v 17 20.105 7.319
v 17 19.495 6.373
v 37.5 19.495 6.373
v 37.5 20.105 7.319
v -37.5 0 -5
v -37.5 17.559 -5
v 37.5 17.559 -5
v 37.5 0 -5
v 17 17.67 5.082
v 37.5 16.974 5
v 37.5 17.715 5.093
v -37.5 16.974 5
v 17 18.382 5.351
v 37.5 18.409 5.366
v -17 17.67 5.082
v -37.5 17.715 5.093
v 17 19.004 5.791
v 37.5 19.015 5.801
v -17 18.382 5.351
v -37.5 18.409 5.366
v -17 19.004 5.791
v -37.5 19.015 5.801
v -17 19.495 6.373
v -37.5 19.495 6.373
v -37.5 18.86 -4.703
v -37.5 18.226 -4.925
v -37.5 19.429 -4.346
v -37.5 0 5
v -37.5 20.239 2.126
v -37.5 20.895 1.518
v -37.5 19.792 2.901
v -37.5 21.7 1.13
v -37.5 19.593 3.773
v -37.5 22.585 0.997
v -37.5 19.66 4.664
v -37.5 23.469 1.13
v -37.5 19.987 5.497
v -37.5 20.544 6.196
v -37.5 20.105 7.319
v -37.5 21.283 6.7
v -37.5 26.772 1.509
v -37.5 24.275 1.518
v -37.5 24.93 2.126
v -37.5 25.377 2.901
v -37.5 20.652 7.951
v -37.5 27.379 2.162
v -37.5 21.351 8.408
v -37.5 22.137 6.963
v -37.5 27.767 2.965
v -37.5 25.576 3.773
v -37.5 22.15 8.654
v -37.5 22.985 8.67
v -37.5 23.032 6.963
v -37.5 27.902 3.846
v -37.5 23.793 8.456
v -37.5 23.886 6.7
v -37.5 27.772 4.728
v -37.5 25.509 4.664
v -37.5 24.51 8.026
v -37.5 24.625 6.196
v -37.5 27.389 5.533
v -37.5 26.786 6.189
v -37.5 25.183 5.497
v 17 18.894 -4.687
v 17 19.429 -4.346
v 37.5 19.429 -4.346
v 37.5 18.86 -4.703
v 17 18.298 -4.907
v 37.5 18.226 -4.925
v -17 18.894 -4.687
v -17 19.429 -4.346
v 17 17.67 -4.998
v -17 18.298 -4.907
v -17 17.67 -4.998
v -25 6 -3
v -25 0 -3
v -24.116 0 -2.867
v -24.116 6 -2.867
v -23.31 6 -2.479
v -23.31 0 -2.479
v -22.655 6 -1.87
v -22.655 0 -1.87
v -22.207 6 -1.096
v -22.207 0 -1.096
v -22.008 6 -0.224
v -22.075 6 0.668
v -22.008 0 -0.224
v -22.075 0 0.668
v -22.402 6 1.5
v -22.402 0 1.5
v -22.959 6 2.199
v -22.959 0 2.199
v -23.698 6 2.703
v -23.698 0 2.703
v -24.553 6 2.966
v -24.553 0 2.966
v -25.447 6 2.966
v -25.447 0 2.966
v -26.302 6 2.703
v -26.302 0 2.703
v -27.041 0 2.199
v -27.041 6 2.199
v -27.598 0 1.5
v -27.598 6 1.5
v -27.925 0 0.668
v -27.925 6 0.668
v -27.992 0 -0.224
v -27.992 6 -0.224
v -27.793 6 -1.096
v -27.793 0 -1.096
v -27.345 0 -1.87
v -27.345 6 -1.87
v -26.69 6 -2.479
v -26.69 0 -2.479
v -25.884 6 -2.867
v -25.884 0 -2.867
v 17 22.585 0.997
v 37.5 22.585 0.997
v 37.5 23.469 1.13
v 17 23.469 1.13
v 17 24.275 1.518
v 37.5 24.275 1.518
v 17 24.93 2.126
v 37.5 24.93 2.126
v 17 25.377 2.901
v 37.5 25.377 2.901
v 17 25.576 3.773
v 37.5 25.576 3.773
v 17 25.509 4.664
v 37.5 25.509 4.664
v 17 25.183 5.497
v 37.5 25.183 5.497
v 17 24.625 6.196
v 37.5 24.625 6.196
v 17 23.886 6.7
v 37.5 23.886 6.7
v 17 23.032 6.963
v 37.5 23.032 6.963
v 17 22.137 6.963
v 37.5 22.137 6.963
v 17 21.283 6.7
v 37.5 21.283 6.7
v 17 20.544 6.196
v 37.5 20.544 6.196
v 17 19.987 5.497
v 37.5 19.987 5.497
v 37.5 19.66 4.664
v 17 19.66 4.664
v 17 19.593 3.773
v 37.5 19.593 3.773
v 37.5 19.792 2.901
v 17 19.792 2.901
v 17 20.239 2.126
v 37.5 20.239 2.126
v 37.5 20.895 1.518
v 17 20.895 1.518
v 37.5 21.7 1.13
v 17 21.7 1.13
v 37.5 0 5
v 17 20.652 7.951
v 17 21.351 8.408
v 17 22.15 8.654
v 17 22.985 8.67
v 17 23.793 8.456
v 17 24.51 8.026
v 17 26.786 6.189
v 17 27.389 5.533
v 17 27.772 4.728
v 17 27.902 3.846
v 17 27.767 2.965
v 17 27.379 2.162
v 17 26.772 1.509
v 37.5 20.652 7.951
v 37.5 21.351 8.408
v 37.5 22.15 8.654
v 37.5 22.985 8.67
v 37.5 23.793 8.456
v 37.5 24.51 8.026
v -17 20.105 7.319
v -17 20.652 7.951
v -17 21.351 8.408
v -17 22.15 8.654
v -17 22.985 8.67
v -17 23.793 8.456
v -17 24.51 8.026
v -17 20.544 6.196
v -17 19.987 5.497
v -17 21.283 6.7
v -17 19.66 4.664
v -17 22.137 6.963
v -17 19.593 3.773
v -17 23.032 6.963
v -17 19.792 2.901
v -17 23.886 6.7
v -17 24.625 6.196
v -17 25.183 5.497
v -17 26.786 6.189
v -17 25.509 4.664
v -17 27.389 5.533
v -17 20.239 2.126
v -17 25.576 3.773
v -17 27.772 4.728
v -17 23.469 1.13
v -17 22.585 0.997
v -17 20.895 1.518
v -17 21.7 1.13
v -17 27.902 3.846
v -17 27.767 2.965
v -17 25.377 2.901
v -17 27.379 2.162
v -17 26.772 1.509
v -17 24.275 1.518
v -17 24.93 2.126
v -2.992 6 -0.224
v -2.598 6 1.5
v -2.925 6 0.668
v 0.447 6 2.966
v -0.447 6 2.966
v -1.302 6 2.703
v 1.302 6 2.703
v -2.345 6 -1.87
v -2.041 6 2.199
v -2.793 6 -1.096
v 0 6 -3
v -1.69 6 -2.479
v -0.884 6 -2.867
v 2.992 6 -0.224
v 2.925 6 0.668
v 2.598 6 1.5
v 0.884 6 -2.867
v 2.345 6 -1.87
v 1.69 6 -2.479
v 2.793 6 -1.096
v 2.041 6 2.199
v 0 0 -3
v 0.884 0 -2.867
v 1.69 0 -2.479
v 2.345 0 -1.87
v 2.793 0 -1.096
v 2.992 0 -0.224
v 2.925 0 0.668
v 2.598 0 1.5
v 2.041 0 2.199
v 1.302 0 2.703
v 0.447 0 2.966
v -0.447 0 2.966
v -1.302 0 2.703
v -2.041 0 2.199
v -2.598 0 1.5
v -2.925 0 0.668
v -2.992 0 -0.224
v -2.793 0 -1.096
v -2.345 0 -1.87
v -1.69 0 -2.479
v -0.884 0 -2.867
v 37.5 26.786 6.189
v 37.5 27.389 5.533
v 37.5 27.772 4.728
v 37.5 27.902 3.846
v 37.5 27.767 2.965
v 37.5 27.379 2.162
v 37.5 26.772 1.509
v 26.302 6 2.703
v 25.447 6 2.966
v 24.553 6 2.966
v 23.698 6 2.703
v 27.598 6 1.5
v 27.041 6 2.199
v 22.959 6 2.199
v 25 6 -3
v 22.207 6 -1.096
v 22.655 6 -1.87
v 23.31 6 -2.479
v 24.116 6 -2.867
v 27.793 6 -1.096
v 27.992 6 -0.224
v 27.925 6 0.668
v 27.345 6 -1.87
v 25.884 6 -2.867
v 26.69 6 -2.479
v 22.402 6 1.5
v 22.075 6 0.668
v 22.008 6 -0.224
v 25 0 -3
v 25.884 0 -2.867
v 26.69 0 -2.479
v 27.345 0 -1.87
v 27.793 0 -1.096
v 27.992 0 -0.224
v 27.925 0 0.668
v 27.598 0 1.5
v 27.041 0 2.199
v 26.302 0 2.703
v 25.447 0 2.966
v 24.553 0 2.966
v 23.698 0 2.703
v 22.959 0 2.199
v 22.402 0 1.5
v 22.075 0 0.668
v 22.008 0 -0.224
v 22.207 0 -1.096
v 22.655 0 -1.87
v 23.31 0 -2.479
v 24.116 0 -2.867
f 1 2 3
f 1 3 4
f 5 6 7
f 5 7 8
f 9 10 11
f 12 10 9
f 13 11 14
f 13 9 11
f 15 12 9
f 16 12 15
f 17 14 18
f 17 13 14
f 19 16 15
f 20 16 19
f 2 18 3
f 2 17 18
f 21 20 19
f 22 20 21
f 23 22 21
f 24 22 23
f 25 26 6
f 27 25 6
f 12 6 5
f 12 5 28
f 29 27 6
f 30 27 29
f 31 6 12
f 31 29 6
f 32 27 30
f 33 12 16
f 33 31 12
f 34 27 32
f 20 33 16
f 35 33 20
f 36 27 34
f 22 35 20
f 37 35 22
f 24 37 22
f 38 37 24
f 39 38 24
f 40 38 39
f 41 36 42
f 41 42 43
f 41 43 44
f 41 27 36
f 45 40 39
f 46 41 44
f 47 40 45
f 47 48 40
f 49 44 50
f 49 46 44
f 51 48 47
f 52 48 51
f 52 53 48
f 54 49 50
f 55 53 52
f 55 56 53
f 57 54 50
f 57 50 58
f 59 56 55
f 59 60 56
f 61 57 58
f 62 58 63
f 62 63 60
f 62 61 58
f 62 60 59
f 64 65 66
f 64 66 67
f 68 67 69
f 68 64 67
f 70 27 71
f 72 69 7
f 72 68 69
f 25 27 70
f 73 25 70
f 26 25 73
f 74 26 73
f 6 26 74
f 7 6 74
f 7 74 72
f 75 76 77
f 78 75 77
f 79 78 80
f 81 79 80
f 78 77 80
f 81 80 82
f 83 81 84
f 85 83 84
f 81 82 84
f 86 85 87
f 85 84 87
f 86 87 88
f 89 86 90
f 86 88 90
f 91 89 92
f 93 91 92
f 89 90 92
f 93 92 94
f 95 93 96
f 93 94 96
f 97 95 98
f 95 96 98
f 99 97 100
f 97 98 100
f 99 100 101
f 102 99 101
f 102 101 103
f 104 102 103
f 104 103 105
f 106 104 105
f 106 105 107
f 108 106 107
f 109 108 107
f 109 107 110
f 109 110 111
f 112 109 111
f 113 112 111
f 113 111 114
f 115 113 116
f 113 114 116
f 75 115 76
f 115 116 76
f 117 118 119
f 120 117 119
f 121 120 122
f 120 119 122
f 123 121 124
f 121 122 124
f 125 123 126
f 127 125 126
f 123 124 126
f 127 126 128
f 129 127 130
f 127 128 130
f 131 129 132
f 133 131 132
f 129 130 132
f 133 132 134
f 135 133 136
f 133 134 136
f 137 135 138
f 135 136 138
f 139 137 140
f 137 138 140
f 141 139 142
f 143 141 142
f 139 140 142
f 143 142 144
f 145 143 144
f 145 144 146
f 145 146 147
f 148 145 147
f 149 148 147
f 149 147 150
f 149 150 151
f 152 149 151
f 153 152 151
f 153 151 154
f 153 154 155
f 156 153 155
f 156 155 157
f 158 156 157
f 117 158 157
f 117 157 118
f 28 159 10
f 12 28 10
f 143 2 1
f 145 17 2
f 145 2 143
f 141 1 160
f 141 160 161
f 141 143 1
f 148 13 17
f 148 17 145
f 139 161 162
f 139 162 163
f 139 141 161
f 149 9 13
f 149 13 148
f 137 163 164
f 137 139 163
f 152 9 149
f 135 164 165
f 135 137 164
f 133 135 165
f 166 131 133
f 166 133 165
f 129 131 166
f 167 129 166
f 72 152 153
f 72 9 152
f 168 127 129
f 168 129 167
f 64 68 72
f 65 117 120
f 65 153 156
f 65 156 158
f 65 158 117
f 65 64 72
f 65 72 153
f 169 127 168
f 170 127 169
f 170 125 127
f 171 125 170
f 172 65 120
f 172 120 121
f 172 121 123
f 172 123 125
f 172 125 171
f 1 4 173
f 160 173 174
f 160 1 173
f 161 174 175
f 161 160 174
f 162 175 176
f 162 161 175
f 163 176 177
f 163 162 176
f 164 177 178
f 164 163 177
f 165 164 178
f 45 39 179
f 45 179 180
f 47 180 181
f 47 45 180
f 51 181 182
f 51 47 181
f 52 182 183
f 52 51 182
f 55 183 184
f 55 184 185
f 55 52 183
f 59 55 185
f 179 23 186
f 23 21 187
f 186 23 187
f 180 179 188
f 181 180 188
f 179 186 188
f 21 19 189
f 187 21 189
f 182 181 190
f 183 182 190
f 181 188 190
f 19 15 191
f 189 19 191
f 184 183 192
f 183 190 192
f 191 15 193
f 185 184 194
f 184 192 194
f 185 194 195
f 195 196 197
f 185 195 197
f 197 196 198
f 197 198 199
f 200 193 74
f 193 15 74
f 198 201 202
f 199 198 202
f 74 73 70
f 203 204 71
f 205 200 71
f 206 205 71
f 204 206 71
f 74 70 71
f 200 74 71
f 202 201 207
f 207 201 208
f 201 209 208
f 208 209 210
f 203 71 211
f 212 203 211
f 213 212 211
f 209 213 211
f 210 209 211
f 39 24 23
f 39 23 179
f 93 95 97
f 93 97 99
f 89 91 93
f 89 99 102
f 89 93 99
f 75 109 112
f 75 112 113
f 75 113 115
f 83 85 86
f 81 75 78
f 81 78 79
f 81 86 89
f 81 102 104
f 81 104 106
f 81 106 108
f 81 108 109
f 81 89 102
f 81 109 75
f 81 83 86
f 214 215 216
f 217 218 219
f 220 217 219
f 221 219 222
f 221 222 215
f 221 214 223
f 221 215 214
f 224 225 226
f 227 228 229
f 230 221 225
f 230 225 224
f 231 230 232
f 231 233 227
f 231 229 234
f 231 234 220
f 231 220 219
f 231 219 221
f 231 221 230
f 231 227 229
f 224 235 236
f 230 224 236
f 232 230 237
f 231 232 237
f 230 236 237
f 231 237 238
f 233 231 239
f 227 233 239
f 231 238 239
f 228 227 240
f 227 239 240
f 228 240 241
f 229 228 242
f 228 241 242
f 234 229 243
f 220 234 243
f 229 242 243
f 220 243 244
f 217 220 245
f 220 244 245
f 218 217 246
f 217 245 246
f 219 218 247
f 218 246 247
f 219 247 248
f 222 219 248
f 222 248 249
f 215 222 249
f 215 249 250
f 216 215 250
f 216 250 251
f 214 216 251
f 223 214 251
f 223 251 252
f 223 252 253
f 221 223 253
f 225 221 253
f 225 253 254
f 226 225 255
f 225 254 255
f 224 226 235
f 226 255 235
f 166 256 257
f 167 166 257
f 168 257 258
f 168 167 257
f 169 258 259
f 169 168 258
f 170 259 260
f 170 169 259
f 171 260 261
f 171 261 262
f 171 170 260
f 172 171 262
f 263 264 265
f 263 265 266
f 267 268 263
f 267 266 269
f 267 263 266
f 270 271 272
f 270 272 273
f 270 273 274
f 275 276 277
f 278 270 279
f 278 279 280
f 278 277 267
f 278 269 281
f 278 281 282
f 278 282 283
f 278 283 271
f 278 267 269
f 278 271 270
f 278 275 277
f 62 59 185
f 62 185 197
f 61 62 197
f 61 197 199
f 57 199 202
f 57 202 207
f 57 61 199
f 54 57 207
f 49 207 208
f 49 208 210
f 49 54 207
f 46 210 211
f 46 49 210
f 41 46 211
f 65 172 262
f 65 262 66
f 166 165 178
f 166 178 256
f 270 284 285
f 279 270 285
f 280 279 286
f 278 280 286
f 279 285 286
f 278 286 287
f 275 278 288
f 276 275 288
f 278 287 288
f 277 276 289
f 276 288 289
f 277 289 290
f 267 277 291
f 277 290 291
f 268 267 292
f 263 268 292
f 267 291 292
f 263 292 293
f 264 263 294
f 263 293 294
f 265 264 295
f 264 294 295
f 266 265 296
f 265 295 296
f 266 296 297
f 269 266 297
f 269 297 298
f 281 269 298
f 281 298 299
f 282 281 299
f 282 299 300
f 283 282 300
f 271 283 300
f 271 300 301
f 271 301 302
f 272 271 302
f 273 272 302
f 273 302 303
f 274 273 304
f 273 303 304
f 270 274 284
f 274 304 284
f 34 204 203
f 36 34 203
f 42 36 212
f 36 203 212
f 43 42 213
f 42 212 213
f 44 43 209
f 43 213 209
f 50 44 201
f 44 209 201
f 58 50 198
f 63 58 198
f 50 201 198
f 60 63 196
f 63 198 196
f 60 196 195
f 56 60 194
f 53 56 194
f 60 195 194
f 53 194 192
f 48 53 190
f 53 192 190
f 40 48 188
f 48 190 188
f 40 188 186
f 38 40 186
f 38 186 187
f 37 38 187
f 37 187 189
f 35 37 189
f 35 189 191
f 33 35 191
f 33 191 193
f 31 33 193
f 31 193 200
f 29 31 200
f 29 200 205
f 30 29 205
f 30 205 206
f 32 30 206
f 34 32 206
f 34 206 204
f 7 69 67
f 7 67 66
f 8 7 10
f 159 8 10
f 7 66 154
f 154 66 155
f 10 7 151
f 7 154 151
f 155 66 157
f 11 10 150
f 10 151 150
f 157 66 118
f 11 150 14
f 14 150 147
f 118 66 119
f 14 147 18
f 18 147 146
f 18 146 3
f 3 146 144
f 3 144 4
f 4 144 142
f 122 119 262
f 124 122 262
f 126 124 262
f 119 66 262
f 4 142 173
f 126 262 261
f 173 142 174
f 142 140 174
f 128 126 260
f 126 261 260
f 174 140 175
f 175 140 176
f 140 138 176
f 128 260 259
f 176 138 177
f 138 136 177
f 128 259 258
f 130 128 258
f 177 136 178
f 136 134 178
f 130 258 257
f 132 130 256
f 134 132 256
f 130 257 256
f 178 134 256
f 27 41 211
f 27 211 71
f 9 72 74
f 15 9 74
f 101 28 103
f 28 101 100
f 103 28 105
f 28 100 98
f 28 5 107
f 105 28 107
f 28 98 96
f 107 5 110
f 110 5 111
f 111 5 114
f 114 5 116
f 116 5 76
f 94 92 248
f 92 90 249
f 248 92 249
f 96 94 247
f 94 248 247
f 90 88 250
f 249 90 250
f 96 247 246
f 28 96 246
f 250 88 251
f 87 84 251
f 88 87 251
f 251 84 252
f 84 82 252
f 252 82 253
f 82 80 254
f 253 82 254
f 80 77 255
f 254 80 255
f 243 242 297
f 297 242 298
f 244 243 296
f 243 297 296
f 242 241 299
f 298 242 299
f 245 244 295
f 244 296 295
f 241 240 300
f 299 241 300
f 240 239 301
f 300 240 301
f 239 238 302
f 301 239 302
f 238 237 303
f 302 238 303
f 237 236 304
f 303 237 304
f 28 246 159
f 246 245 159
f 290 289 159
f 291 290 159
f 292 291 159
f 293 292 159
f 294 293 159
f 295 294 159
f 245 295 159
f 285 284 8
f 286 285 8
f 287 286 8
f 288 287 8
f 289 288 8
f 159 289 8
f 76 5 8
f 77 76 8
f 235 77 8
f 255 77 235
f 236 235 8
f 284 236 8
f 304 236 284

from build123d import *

# Parameters (mm, degrees)
CROQUIS1_W              = 75
CROQUIS1_H              = 10
SALIENTE_EXTRUIR1_DEPTH = 15
SALIENTE_EXTRUIR2_DEPTH = 75
CROQUIS3_W              = 34
CROQUIS3_H              = 20.463300895
CORTAR_EXTRUIR1_DEPTH   = 53
CROQUIS4_R              = 3
CORTAR_EXTRUIR2_DEPTH   = 82
CROQUIS5_R              = 3
CORTAR_EXTRUIR3_DEPTH   = 6


with BuildPart() as part:
    # Croquis1 → Saliente-Extruir1 (new body)
    with BuildSketch(Plane(origin=(0, 0, 0), x_dir=(1, 0, 0), z_dir=(0, 1, 0))):
        Rectangle(CROQUIS1_W, CROQUIS1_H)
    extrude(amount=SALIENTE_EXTRUIR1_DEPTH)

    # Croquis2 → Saliente-Extruir2 (add)
    with BuildSketch(Plane.ZY.offset(37.5)):
        with BuildLine():
            Line((-5, 15), (5, 15))
            Line((5, 15), (5, 16.974190569))
            ThreePointArc((5, 16.974190569), (5.365546157, 18.409339673), (6.373101968, 19.494746617))
            Line((6.373101968, 19.494746617), (7.318770394, 20.105130227))
            ThreePointArc((7.318770394, 20.105130227), (8.653897933, 22.149866442), (8.026350555, 24.509886785))
            Line((8.026350555, 24.509886785), (6.189450494, 26.785760885))
            ThreePointArc((6.189450494, 26.785760885), (3.846087211, 27.901547218), (1.509374249, 26.77189986))
            Line((1.509374249, 26.77189986), (-4.34559805, 19.429162497))
            ThreePointArc((-4.34559805, 19.429162497), (-4.831677431, 18.549581775), (-5, 17.558823013))
            Line((-5, 17.558823013), (-5, 15))
        make_face()
    extrude(amount=-SALIENTE_EXTRUIR2_DEPTH)

    # Croquis3 → Cortar-Extruir1 (cut)
    with BuildSketch(Plane(origin=(0, 0, -5), x_dir=(-1, 0, 0), z_dir=(0, 0, -1))):
        with Locations((0, 27.901560376)):
            Rectangle(CROQUIS3_W, CROQUIS3_H)
    extrude(amount=-CORTAR_EXTRUIR1_DEPTH, mode=Mode.SUBTRACT)

    # Croquis4 → Cortar-Extruir2 (cut)
    with BuildSketch(Plane(origin=(37.5, 0, 0), x_dir=(0, 0, -1), z_dir=(1, 0, 0))):
        with Locations((-3.996707054, 22.584588981)):
            Circle(CROQUIS4_R)
    extrude(amount=-CORTAR_EXTRUIR2_DEPTH, mode=Mode.SUBTRACT)

    # Croquis5 → Cortar-Extruir3 (cut)
    with BuildSketch(Plane.XZ):
        with Locations(Location((0, 0, 0), (0, 0, 270))):
            Circle(CROQUIS5_R)
        with Locations(Location((25, 0, 0), (0, 0, 270))):
            Circle(CROQUIS5_R)
        with Locations(Location((-25, 0, 0), (0, 0, 270))):
            Circle(CROQUIS5_R)
    extrude(amount=-CORTAR_EXTRUIR3_DEPTH, mode=Mode.SUBTRACT)


solid = part.part
